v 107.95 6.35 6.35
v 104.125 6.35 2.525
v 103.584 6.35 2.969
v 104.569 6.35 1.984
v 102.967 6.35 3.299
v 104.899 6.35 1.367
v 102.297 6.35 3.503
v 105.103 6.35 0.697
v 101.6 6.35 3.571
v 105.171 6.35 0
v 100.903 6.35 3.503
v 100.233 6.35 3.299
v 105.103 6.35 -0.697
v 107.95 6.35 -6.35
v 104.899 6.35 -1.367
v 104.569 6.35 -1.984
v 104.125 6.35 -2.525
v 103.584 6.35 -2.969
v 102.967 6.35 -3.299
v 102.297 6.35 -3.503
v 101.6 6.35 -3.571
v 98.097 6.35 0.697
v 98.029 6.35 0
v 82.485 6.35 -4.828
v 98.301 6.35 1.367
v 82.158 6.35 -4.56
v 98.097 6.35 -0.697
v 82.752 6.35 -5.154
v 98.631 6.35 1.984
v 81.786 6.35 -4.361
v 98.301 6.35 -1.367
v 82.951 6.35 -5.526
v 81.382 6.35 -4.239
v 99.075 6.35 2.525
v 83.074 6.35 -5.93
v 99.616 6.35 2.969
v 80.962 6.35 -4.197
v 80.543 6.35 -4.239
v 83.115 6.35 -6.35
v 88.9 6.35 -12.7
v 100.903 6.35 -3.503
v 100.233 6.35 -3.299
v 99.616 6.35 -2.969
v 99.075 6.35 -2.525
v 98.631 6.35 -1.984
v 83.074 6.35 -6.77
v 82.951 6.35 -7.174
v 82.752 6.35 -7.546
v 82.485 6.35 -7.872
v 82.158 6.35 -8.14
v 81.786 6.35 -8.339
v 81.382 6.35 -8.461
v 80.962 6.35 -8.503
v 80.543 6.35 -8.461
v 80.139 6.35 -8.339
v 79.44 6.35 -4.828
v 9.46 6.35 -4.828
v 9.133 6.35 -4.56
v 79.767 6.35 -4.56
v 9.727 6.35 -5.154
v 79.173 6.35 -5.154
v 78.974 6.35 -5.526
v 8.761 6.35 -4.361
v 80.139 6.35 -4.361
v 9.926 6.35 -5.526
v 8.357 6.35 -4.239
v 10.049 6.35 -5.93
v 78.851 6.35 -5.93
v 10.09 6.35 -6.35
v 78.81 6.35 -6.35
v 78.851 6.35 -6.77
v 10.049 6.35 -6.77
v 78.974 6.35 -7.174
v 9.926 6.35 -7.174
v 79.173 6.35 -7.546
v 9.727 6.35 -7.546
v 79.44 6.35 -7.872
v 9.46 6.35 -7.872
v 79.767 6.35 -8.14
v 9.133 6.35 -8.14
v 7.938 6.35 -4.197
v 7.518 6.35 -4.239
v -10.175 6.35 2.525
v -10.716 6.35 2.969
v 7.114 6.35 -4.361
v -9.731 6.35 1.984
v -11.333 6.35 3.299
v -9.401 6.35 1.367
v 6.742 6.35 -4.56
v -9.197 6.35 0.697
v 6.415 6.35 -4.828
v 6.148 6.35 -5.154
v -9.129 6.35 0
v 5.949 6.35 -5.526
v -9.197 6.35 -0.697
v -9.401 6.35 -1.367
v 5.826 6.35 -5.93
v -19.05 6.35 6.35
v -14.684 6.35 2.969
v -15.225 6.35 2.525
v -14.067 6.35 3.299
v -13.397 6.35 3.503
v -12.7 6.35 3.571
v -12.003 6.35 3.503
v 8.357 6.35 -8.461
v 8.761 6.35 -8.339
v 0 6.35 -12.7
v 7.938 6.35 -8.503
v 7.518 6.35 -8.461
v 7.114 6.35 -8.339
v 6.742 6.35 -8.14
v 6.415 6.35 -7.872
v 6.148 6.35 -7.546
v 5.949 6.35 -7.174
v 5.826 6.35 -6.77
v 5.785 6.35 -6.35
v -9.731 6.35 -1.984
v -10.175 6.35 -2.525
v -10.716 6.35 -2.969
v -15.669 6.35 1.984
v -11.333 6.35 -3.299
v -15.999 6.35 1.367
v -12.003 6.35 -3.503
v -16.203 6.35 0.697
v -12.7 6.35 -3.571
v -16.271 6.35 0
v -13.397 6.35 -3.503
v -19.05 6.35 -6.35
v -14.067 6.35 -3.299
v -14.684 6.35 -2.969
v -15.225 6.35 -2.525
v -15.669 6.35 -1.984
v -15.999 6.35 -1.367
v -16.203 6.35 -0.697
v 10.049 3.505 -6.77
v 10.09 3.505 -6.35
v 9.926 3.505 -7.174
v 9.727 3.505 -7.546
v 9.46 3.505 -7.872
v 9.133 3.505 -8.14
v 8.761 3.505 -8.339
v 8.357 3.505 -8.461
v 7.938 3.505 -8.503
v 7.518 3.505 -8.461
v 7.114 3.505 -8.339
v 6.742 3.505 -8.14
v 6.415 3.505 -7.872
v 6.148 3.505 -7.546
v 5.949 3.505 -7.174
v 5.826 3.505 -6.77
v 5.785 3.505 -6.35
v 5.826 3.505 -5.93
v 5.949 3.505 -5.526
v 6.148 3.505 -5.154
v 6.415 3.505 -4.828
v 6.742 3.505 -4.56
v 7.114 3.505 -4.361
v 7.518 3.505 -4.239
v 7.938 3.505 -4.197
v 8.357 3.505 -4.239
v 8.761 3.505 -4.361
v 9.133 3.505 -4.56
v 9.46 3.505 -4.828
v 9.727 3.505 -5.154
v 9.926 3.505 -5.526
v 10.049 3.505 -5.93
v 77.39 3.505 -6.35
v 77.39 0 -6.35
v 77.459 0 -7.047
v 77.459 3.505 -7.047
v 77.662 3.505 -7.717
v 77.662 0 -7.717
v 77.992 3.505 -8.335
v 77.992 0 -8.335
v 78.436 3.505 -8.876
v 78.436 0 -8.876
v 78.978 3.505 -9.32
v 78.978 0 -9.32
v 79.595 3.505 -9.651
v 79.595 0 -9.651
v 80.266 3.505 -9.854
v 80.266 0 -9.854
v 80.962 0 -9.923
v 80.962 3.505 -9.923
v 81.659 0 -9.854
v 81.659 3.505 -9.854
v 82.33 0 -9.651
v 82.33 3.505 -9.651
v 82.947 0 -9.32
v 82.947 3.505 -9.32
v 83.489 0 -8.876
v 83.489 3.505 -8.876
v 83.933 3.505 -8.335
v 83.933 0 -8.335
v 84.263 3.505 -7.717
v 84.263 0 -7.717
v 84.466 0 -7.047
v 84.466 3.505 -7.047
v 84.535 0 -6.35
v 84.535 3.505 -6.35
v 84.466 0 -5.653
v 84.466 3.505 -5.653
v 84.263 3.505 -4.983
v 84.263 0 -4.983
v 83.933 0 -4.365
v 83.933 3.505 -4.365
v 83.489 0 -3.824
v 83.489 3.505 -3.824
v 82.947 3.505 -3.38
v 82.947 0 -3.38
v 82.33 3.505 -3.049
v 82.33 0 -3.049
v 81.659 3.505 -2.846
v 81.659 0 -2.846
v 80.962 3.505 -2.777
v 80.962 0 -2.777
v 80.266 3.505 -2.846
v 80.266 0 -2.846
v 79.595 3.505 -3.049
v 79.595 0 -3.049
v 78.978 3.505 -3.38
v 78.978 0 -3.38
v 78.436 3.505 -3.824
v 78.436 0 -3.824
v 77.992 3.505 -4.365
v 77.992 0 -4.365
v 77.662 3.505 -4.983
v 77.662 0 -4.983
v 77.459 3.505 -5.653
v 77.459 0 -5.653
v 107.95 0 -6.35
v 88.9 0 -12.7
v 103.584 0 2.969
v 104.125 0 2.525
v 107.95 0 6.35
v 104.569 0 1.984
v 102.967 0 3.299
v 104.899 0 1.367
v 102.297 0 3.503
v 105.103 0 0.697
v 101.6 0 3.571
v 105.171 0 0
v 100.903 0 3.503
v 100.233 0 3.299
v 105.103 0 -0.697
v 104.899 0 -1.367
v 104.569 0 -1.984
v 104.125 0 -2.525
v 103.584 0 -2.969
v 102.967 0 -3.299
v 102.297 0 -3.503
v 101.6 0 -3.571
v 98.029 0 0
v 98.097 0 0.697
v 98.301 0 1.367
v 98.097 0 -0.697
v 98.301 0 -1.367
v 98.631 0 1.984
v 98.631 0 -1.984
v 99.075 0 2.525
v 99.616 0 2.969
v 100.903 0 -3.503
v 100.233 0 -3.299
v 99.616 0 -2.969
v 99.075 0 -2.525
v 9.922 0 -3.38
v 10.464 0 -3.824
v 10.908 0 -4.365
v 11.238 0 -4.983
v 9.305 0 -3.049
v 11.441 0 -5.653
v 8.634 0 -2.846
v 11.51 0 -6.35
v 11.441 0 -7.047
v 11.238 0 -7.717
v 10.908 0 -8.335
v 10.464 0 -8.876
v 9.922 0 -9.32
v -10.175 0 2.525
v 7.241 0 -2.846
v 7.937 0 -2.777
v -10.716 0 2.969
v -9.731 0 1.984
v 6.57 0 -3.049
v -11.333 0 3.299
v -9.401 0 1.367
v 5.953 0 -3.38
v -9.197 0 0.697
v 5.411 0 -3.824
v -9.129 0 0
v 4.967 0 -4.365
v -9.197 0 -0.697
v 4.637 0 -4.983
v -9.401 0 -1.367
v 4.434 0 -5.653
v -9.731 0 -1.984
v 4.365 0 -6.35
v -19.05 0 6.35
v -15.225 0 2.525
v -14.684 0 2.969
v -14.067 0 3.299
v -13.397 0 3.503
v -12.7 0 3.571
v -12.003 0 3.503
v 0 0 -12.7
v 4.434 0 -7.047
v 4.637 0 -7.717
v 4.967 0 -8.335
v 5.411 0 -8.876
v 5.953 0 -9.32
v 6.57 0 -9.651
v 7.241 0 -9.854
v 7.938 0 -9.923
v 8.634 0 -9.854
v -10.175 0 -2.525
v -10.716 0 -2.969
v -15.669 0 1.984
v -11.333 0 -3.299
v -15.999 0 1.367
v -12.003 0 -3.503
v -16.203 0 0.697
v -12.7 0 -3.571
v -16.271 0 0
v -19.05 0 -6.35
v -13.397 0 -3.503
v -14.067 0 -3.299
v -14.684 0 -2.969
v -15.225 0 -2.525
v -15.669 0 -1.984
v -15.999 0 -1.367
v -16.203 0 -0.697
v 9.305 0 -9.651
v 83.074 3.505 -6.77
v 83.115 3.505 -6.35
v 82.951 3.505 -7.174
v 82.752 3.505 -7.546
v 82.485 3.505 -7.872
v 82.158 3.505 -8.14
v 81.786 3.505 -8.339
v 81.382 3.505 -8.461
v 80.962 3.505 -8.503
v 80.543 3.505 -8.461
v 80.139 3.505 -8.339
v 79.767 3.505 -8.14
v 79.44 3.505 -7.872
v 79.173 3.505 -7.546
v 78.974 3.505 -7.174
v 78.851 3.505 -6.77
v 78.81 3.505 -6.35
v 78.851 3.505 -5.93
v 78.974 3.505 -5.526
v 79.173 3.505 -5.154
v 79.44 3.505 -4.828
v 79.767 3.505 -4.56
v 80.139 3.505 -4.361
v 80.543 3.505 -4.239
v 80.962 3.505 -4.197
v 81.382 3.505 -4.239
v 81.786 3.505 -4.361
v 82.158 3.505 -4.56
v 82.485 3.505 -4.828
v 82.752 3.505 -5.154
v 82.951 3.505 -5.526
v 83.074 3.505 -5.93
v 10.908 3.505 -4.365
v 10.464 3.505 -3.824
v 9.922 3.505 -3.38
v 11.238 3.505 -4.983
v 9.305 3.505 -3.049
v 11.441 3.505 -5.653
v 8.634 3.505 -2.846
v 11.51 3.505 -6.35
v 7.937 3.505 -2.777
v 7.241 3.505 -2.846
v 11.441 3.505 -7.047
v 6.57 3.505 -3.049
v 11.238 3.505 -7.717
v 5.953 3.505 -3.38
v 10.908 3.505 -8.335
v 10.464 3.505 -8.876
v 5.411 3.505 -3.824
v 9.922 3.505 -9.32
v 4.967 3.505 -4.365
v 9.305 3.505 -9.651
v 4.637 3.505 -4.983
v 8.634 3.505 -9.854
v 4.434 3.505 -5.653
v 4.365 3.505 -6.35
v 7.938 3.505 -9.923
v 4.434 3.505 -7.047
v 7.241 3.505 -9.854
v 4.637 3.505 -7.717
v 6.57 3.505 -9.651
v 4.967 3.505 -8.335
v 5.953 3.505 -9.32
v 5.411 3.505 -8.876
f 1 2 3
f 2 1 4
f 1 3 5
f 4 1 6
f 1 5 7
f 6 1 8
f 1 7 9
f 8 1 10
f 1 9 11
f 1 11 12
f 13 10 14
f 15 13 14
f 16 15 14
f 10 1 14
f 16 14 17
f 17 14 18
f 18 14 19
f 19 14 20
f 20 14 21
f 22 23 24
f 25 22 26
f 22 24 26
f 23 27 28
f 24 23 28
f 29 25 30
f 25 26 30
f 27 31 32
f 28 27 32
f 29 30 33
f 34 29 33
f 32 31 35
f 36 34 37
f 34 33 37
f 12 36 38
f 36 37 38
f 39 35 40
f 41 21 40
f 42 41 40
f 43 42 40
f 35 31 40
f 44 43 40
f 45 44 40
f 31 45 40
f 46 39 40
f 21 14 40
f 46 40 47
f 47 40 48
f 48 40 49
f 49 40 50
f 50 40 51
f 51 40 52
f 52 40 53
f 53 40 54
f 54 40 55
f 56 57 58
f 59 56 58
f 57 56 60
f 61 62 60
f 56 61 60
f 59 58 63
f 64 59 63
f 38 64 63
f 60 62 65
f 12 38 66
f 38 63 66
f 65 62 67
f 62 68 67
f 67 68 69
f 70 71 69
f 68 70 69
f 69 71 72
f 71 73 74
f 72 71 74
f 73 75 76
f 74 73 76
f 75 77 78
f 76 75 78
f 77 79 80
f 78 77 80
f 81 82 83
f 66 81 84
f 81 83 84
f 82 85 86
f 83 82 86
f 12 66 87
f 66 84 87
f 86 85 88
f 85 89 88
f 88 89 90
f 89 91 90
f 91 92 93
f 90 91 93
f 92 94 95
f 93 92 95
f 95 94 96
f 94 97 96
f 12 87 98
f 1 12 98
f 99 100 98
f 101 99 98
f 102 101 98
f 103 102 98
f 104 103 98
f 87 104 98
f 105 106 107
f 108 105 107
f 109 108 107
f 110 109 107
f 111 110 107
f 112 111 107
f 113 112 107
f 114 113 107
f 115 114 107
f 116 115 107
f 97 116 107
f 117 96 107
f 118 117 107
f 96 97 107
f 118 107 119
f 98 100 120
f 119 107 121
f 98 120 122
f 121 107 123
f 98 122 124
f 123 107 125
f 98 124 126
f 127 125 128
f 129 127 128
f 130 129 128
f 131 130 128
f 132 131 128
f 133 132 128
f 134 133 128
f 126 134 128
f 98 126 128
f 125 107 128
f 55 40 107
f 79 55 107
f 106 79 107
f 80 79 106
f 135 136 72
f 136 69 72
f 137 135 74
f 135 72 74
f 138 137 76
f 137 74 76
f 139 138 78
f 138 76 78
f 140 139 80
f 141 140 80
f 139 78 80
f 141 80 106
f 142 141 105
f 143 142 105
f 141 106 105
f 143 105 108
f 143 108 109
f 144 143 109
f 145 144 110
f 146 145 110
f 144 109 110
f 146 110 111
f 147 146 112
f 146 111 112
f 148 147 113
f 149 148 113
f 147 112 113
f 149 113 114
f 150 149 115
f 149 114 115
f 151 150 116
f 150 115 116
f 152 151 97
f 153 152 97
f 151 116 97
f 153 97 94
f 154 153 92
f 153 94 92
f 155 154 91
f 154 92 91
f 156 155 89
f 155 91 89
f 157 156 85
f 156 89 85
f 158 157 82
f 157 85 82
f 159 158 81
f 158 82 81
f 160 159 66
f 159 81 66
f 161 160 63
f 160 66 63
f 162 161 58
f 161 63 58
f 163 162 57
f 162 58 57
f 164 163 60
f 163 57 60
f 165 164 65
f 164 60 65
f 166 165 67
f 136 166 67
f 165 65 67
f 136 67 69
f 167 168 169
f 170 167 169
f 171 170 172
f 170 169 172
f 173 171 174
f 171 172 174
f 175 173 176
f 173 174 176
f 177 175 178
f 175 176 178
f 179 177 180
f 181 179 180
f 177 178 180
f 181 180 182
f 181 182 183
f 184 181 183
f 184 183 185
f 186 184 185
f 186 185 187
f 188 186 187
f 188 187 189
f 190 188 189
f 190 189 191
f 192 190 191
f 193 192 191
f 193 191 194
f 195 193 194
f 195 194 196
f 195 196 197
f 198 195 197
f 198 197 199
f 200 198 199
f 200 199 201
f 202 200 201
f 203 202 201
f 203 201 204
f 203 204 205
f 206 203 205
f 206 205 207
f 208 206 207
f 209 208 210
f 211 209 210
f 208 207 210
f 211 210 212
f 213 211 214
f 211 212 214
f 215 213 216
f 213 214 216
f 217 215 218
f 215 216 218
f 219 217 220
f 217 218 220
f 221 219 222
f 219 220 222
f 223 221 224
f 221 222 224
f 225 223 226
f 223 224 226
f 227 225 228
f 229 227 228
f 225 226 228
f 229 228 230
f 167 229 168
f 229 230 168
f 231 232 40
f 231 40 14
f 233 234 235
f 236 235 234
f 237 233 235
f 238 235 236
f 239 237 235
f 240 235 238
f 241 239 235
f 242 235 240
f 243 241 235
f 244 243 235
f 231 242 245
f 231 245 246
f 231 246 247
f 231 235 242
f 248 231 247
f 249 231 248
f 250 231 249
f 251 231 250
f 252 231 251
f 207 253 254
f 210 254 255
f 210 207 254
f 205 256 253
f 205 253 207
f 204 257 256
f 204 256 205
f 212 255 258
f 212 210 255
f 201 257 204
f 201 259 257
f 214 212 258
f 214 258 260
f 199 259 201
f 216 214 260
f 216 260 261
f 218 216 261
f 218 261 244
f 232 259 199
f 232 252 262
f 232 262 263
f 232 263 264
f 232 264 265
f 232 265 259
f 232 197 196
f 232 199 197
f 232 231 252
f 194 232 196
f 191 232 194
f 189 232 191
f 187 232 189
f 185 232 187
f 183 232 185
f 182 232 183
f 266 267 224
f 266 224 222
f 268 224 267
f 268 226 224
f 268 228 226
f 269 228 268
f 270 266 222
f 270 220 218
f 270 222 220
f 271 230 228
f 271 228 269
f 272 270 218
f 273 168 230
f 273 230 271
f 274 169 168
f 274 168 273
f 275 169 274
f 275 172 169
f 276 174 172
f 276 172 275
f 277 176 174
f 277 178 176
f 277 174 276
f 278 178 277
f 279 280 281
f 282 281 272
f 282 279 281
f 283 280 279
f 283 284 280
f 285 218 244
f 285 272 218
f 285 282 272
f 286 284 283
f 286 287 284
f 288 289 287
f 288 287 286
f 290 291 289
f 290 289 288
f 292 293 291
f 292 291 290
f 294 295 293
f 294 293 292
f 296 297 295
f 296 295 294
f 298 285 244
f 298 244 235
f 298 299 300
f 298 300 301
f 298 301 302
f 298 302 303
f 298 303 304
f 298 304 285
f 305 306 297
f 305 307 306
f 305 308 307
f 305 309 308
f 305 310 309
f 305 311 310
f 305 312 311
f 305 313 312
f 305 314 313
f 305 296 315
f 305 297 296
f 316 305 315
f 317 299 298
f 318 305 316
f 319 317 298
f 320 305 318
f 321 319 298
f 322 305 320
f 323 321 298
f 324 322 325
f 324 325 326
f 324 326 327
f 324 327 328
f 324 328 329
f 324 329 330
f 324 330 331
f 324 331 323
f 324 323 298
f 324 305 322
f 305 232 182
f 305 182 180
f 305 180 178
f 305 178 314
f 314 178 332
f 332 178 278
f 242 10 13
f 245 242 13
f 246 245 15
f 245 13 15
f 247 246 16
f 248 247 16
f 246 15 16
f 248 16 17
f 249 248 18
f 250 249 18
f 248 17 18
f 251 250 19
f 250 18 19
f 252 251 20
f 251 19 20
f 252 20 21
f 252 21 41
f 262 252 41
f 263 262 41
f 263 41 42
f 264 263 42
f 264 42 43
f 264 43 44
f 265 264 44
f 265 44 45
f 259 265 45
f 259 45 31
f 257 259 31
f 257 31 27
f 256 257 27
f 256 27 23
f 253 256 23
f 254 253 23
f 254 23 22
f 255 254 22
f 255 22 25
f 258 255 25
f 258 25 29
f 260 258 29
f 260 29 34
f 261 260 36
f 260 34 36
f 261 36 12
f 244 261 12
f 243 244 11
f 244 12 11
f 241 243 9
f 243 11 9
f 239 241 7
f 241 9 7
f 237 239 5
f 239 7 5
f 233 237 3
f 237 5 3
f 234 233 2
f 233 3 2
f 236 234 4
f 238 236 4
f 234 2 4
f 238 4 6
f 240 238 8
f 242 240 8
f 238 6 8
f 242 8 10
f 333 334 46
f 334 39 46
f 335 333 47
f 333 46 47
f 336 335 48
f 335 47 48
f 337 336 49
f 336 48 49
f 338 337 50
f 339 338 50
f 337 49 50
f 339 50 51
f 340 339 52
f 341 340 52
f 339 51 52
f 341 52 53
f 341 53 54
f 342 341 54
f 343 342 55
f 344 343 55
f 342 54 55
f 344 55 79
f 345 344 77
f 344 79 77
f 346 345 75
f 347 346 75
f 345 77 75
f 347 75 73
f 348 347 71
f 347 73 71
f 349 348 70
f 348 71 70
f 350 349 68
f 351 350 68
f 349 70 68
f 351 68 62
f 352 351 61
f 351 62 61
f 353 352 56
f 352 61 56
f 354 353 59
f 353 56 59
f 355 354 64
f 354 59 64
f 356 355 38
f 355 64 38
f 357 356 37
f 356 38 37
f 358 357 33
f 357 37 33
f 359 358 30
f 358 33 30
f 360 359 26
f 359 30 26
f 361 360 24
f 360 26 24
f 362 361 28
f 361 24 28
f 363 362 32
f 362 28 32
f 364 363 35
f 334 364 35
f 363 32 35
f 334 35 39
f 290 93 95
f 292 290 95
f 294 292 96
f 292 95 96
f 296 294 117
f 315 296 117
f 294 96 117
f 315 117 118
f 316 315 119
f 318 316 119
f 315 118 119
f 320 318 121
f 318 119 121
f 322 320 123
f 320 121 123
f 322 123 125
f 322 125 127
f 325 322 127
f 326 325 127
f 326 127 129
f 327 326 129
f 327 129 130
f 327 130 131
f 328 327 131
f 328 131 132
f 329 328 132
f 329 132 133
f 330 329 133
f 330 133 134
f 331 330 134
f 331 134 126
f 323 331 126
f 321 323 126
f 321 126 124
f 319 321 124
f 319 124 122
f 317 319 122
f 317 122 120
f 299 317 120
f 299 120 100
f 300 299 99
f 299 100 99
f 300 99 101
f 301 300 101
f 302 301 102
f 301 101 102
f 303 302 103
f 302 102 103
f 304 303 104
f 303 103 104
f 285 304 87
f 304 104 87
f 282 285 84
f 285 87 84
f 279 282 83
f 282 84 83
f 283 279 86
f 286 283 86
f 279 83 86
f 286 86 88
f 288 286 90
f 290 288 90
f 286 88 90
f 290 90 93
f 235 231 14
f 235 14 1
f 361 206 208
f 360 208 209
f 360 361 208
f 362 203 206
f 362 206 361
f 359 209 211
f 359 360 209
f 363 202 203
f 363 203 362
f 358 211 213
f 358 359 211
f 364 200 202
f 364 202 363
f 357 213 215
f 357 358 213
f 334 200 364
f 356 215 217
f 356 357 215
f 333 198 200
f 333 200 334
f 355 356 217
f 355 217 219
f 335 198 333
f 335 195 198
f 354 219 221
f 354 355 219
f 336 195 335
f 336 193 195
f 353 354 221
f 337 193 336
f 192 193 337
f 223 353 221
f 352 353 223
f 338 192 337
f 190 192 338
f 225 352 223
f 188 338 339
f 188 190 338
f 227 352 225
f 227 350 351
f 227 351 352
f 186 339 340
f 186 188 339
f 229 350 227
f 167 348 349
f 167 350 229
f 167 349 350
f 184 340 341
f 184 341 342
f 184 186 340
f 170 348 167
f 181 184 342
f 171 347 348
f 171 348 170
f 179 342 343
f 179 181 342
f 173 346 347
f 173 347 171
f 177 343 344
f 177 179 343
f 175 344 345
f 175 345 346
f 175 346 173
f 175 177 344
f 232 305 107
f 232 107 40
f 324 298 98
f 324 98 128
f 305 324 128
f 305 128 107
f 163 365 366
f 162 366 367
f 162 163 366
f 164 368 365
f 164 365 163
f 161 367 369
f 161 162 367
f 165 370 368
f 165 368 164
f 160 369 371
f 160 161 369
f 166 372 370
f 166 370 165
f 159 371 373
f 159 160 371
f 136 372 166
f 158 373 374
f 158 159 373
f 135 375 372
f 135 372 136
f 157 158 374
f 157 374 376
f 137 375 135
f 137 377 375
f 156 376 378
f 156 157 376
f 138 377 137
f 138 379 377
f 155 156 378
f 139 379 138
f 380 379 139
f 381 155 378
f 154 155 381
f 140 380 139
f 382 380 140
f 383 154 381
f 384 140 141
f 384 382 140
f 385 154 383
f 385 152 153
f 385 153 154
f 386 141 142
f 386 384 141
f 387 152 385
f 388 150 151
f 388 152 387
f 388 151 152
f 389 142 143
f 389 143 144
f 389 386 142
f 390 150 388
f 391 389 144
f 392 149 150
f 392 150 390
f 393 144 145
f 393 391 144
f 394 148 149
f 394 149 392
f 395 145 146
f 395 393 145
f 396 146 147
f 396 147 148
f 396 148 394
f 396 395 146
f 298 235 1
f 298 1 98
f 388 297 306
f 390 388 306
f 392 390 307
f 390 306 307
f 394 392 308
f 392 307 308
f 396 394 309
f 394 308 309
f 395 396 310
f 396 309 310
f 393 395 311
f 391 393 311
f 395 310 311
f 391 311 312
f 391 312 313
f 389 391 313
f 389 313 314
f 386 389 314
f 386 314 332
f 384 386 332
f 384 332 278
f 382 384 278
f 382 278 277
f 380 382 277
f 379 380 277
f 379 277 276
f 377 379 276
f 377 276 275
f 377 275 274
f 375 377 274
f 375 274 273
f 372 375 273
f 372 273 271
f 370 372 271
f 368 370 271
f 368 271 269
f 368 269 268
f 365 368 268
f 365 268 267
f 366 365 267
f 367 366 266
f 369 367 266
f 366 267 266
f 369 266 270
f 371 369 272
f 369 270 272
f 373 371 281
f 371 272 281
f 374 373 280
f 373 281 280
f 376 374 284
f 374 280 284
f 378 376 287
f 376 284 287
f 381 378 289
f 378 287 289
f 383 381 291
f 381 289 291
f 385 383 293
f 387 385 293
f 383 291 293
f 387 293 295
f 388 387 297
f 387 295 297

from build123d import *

# Parameters (mm, degrees)
BOSS_EXTRUDE1_DEPTH                            = 6.35
F_1_4_CLEARANCE_HOLE2_D                        = 7.14248
CBORE_FOR_6_SOCKET_HEAD_CAP_SCREW1_D           = 4.3053
CBORE_FOR_6_SOCKET_HEAD_CAP_SCREW1_CBORE_D     = 7.14502
CBORE_FOR_6_SOCKET_HEAD_CAP_SCREW1_CBORE_DEPTH = 3.5052


with BuildPart() as part:
    # Sketch1 → Boss-Extrude1 (new body)
    with BuildSketch(Plane(origin=(0, 0, 0), x_dir=(1, 0, 0), z_dir=(0, 1, 0))):
        Polygon((0, 12.7), (88.9, 12.7), (107.95, 6.35), (107.95, -6.35), (-19.05, -6.35), (-19.05, 6.35), align=None)
    extrude(amount=BOSS_EXTRUDE1_DEPTH)

    # 1/4 Clearance Hole2 (through all)
    with Locations(Plane(origin=(0, 0, 0), x_dir=(-1, 0, 0), z_dir=(0, -1, 0))):
        with Locations((-101.6, 0), (12.7, 0)):
            Hole(F_1_4_CLEARANCE_HOLE2_D / 2)

    # CBORE for #6 Socket Head Cap Screw1 (through all)
    with Locations(Plane(origin=(0, 0, 0), x_dir=(-1, 0, 0), z_dir=(0, -1, 0))):
        with Locations((-80.9625, 6.35), (-7.9375, 6.35)):
            CounterBoreHole(CBORE_FOR_6_SOCKET_HEAD_CAP_SCREW1_D / 2, CBORE_FOR_6_SOCKET_HEAD_CAP_SCREW1_CBORE_D / 2, CBORE_FOR_6_SOCKET_HEAD_CAP_SCREW1_CBORE_DEPTH)


solid = part.part
